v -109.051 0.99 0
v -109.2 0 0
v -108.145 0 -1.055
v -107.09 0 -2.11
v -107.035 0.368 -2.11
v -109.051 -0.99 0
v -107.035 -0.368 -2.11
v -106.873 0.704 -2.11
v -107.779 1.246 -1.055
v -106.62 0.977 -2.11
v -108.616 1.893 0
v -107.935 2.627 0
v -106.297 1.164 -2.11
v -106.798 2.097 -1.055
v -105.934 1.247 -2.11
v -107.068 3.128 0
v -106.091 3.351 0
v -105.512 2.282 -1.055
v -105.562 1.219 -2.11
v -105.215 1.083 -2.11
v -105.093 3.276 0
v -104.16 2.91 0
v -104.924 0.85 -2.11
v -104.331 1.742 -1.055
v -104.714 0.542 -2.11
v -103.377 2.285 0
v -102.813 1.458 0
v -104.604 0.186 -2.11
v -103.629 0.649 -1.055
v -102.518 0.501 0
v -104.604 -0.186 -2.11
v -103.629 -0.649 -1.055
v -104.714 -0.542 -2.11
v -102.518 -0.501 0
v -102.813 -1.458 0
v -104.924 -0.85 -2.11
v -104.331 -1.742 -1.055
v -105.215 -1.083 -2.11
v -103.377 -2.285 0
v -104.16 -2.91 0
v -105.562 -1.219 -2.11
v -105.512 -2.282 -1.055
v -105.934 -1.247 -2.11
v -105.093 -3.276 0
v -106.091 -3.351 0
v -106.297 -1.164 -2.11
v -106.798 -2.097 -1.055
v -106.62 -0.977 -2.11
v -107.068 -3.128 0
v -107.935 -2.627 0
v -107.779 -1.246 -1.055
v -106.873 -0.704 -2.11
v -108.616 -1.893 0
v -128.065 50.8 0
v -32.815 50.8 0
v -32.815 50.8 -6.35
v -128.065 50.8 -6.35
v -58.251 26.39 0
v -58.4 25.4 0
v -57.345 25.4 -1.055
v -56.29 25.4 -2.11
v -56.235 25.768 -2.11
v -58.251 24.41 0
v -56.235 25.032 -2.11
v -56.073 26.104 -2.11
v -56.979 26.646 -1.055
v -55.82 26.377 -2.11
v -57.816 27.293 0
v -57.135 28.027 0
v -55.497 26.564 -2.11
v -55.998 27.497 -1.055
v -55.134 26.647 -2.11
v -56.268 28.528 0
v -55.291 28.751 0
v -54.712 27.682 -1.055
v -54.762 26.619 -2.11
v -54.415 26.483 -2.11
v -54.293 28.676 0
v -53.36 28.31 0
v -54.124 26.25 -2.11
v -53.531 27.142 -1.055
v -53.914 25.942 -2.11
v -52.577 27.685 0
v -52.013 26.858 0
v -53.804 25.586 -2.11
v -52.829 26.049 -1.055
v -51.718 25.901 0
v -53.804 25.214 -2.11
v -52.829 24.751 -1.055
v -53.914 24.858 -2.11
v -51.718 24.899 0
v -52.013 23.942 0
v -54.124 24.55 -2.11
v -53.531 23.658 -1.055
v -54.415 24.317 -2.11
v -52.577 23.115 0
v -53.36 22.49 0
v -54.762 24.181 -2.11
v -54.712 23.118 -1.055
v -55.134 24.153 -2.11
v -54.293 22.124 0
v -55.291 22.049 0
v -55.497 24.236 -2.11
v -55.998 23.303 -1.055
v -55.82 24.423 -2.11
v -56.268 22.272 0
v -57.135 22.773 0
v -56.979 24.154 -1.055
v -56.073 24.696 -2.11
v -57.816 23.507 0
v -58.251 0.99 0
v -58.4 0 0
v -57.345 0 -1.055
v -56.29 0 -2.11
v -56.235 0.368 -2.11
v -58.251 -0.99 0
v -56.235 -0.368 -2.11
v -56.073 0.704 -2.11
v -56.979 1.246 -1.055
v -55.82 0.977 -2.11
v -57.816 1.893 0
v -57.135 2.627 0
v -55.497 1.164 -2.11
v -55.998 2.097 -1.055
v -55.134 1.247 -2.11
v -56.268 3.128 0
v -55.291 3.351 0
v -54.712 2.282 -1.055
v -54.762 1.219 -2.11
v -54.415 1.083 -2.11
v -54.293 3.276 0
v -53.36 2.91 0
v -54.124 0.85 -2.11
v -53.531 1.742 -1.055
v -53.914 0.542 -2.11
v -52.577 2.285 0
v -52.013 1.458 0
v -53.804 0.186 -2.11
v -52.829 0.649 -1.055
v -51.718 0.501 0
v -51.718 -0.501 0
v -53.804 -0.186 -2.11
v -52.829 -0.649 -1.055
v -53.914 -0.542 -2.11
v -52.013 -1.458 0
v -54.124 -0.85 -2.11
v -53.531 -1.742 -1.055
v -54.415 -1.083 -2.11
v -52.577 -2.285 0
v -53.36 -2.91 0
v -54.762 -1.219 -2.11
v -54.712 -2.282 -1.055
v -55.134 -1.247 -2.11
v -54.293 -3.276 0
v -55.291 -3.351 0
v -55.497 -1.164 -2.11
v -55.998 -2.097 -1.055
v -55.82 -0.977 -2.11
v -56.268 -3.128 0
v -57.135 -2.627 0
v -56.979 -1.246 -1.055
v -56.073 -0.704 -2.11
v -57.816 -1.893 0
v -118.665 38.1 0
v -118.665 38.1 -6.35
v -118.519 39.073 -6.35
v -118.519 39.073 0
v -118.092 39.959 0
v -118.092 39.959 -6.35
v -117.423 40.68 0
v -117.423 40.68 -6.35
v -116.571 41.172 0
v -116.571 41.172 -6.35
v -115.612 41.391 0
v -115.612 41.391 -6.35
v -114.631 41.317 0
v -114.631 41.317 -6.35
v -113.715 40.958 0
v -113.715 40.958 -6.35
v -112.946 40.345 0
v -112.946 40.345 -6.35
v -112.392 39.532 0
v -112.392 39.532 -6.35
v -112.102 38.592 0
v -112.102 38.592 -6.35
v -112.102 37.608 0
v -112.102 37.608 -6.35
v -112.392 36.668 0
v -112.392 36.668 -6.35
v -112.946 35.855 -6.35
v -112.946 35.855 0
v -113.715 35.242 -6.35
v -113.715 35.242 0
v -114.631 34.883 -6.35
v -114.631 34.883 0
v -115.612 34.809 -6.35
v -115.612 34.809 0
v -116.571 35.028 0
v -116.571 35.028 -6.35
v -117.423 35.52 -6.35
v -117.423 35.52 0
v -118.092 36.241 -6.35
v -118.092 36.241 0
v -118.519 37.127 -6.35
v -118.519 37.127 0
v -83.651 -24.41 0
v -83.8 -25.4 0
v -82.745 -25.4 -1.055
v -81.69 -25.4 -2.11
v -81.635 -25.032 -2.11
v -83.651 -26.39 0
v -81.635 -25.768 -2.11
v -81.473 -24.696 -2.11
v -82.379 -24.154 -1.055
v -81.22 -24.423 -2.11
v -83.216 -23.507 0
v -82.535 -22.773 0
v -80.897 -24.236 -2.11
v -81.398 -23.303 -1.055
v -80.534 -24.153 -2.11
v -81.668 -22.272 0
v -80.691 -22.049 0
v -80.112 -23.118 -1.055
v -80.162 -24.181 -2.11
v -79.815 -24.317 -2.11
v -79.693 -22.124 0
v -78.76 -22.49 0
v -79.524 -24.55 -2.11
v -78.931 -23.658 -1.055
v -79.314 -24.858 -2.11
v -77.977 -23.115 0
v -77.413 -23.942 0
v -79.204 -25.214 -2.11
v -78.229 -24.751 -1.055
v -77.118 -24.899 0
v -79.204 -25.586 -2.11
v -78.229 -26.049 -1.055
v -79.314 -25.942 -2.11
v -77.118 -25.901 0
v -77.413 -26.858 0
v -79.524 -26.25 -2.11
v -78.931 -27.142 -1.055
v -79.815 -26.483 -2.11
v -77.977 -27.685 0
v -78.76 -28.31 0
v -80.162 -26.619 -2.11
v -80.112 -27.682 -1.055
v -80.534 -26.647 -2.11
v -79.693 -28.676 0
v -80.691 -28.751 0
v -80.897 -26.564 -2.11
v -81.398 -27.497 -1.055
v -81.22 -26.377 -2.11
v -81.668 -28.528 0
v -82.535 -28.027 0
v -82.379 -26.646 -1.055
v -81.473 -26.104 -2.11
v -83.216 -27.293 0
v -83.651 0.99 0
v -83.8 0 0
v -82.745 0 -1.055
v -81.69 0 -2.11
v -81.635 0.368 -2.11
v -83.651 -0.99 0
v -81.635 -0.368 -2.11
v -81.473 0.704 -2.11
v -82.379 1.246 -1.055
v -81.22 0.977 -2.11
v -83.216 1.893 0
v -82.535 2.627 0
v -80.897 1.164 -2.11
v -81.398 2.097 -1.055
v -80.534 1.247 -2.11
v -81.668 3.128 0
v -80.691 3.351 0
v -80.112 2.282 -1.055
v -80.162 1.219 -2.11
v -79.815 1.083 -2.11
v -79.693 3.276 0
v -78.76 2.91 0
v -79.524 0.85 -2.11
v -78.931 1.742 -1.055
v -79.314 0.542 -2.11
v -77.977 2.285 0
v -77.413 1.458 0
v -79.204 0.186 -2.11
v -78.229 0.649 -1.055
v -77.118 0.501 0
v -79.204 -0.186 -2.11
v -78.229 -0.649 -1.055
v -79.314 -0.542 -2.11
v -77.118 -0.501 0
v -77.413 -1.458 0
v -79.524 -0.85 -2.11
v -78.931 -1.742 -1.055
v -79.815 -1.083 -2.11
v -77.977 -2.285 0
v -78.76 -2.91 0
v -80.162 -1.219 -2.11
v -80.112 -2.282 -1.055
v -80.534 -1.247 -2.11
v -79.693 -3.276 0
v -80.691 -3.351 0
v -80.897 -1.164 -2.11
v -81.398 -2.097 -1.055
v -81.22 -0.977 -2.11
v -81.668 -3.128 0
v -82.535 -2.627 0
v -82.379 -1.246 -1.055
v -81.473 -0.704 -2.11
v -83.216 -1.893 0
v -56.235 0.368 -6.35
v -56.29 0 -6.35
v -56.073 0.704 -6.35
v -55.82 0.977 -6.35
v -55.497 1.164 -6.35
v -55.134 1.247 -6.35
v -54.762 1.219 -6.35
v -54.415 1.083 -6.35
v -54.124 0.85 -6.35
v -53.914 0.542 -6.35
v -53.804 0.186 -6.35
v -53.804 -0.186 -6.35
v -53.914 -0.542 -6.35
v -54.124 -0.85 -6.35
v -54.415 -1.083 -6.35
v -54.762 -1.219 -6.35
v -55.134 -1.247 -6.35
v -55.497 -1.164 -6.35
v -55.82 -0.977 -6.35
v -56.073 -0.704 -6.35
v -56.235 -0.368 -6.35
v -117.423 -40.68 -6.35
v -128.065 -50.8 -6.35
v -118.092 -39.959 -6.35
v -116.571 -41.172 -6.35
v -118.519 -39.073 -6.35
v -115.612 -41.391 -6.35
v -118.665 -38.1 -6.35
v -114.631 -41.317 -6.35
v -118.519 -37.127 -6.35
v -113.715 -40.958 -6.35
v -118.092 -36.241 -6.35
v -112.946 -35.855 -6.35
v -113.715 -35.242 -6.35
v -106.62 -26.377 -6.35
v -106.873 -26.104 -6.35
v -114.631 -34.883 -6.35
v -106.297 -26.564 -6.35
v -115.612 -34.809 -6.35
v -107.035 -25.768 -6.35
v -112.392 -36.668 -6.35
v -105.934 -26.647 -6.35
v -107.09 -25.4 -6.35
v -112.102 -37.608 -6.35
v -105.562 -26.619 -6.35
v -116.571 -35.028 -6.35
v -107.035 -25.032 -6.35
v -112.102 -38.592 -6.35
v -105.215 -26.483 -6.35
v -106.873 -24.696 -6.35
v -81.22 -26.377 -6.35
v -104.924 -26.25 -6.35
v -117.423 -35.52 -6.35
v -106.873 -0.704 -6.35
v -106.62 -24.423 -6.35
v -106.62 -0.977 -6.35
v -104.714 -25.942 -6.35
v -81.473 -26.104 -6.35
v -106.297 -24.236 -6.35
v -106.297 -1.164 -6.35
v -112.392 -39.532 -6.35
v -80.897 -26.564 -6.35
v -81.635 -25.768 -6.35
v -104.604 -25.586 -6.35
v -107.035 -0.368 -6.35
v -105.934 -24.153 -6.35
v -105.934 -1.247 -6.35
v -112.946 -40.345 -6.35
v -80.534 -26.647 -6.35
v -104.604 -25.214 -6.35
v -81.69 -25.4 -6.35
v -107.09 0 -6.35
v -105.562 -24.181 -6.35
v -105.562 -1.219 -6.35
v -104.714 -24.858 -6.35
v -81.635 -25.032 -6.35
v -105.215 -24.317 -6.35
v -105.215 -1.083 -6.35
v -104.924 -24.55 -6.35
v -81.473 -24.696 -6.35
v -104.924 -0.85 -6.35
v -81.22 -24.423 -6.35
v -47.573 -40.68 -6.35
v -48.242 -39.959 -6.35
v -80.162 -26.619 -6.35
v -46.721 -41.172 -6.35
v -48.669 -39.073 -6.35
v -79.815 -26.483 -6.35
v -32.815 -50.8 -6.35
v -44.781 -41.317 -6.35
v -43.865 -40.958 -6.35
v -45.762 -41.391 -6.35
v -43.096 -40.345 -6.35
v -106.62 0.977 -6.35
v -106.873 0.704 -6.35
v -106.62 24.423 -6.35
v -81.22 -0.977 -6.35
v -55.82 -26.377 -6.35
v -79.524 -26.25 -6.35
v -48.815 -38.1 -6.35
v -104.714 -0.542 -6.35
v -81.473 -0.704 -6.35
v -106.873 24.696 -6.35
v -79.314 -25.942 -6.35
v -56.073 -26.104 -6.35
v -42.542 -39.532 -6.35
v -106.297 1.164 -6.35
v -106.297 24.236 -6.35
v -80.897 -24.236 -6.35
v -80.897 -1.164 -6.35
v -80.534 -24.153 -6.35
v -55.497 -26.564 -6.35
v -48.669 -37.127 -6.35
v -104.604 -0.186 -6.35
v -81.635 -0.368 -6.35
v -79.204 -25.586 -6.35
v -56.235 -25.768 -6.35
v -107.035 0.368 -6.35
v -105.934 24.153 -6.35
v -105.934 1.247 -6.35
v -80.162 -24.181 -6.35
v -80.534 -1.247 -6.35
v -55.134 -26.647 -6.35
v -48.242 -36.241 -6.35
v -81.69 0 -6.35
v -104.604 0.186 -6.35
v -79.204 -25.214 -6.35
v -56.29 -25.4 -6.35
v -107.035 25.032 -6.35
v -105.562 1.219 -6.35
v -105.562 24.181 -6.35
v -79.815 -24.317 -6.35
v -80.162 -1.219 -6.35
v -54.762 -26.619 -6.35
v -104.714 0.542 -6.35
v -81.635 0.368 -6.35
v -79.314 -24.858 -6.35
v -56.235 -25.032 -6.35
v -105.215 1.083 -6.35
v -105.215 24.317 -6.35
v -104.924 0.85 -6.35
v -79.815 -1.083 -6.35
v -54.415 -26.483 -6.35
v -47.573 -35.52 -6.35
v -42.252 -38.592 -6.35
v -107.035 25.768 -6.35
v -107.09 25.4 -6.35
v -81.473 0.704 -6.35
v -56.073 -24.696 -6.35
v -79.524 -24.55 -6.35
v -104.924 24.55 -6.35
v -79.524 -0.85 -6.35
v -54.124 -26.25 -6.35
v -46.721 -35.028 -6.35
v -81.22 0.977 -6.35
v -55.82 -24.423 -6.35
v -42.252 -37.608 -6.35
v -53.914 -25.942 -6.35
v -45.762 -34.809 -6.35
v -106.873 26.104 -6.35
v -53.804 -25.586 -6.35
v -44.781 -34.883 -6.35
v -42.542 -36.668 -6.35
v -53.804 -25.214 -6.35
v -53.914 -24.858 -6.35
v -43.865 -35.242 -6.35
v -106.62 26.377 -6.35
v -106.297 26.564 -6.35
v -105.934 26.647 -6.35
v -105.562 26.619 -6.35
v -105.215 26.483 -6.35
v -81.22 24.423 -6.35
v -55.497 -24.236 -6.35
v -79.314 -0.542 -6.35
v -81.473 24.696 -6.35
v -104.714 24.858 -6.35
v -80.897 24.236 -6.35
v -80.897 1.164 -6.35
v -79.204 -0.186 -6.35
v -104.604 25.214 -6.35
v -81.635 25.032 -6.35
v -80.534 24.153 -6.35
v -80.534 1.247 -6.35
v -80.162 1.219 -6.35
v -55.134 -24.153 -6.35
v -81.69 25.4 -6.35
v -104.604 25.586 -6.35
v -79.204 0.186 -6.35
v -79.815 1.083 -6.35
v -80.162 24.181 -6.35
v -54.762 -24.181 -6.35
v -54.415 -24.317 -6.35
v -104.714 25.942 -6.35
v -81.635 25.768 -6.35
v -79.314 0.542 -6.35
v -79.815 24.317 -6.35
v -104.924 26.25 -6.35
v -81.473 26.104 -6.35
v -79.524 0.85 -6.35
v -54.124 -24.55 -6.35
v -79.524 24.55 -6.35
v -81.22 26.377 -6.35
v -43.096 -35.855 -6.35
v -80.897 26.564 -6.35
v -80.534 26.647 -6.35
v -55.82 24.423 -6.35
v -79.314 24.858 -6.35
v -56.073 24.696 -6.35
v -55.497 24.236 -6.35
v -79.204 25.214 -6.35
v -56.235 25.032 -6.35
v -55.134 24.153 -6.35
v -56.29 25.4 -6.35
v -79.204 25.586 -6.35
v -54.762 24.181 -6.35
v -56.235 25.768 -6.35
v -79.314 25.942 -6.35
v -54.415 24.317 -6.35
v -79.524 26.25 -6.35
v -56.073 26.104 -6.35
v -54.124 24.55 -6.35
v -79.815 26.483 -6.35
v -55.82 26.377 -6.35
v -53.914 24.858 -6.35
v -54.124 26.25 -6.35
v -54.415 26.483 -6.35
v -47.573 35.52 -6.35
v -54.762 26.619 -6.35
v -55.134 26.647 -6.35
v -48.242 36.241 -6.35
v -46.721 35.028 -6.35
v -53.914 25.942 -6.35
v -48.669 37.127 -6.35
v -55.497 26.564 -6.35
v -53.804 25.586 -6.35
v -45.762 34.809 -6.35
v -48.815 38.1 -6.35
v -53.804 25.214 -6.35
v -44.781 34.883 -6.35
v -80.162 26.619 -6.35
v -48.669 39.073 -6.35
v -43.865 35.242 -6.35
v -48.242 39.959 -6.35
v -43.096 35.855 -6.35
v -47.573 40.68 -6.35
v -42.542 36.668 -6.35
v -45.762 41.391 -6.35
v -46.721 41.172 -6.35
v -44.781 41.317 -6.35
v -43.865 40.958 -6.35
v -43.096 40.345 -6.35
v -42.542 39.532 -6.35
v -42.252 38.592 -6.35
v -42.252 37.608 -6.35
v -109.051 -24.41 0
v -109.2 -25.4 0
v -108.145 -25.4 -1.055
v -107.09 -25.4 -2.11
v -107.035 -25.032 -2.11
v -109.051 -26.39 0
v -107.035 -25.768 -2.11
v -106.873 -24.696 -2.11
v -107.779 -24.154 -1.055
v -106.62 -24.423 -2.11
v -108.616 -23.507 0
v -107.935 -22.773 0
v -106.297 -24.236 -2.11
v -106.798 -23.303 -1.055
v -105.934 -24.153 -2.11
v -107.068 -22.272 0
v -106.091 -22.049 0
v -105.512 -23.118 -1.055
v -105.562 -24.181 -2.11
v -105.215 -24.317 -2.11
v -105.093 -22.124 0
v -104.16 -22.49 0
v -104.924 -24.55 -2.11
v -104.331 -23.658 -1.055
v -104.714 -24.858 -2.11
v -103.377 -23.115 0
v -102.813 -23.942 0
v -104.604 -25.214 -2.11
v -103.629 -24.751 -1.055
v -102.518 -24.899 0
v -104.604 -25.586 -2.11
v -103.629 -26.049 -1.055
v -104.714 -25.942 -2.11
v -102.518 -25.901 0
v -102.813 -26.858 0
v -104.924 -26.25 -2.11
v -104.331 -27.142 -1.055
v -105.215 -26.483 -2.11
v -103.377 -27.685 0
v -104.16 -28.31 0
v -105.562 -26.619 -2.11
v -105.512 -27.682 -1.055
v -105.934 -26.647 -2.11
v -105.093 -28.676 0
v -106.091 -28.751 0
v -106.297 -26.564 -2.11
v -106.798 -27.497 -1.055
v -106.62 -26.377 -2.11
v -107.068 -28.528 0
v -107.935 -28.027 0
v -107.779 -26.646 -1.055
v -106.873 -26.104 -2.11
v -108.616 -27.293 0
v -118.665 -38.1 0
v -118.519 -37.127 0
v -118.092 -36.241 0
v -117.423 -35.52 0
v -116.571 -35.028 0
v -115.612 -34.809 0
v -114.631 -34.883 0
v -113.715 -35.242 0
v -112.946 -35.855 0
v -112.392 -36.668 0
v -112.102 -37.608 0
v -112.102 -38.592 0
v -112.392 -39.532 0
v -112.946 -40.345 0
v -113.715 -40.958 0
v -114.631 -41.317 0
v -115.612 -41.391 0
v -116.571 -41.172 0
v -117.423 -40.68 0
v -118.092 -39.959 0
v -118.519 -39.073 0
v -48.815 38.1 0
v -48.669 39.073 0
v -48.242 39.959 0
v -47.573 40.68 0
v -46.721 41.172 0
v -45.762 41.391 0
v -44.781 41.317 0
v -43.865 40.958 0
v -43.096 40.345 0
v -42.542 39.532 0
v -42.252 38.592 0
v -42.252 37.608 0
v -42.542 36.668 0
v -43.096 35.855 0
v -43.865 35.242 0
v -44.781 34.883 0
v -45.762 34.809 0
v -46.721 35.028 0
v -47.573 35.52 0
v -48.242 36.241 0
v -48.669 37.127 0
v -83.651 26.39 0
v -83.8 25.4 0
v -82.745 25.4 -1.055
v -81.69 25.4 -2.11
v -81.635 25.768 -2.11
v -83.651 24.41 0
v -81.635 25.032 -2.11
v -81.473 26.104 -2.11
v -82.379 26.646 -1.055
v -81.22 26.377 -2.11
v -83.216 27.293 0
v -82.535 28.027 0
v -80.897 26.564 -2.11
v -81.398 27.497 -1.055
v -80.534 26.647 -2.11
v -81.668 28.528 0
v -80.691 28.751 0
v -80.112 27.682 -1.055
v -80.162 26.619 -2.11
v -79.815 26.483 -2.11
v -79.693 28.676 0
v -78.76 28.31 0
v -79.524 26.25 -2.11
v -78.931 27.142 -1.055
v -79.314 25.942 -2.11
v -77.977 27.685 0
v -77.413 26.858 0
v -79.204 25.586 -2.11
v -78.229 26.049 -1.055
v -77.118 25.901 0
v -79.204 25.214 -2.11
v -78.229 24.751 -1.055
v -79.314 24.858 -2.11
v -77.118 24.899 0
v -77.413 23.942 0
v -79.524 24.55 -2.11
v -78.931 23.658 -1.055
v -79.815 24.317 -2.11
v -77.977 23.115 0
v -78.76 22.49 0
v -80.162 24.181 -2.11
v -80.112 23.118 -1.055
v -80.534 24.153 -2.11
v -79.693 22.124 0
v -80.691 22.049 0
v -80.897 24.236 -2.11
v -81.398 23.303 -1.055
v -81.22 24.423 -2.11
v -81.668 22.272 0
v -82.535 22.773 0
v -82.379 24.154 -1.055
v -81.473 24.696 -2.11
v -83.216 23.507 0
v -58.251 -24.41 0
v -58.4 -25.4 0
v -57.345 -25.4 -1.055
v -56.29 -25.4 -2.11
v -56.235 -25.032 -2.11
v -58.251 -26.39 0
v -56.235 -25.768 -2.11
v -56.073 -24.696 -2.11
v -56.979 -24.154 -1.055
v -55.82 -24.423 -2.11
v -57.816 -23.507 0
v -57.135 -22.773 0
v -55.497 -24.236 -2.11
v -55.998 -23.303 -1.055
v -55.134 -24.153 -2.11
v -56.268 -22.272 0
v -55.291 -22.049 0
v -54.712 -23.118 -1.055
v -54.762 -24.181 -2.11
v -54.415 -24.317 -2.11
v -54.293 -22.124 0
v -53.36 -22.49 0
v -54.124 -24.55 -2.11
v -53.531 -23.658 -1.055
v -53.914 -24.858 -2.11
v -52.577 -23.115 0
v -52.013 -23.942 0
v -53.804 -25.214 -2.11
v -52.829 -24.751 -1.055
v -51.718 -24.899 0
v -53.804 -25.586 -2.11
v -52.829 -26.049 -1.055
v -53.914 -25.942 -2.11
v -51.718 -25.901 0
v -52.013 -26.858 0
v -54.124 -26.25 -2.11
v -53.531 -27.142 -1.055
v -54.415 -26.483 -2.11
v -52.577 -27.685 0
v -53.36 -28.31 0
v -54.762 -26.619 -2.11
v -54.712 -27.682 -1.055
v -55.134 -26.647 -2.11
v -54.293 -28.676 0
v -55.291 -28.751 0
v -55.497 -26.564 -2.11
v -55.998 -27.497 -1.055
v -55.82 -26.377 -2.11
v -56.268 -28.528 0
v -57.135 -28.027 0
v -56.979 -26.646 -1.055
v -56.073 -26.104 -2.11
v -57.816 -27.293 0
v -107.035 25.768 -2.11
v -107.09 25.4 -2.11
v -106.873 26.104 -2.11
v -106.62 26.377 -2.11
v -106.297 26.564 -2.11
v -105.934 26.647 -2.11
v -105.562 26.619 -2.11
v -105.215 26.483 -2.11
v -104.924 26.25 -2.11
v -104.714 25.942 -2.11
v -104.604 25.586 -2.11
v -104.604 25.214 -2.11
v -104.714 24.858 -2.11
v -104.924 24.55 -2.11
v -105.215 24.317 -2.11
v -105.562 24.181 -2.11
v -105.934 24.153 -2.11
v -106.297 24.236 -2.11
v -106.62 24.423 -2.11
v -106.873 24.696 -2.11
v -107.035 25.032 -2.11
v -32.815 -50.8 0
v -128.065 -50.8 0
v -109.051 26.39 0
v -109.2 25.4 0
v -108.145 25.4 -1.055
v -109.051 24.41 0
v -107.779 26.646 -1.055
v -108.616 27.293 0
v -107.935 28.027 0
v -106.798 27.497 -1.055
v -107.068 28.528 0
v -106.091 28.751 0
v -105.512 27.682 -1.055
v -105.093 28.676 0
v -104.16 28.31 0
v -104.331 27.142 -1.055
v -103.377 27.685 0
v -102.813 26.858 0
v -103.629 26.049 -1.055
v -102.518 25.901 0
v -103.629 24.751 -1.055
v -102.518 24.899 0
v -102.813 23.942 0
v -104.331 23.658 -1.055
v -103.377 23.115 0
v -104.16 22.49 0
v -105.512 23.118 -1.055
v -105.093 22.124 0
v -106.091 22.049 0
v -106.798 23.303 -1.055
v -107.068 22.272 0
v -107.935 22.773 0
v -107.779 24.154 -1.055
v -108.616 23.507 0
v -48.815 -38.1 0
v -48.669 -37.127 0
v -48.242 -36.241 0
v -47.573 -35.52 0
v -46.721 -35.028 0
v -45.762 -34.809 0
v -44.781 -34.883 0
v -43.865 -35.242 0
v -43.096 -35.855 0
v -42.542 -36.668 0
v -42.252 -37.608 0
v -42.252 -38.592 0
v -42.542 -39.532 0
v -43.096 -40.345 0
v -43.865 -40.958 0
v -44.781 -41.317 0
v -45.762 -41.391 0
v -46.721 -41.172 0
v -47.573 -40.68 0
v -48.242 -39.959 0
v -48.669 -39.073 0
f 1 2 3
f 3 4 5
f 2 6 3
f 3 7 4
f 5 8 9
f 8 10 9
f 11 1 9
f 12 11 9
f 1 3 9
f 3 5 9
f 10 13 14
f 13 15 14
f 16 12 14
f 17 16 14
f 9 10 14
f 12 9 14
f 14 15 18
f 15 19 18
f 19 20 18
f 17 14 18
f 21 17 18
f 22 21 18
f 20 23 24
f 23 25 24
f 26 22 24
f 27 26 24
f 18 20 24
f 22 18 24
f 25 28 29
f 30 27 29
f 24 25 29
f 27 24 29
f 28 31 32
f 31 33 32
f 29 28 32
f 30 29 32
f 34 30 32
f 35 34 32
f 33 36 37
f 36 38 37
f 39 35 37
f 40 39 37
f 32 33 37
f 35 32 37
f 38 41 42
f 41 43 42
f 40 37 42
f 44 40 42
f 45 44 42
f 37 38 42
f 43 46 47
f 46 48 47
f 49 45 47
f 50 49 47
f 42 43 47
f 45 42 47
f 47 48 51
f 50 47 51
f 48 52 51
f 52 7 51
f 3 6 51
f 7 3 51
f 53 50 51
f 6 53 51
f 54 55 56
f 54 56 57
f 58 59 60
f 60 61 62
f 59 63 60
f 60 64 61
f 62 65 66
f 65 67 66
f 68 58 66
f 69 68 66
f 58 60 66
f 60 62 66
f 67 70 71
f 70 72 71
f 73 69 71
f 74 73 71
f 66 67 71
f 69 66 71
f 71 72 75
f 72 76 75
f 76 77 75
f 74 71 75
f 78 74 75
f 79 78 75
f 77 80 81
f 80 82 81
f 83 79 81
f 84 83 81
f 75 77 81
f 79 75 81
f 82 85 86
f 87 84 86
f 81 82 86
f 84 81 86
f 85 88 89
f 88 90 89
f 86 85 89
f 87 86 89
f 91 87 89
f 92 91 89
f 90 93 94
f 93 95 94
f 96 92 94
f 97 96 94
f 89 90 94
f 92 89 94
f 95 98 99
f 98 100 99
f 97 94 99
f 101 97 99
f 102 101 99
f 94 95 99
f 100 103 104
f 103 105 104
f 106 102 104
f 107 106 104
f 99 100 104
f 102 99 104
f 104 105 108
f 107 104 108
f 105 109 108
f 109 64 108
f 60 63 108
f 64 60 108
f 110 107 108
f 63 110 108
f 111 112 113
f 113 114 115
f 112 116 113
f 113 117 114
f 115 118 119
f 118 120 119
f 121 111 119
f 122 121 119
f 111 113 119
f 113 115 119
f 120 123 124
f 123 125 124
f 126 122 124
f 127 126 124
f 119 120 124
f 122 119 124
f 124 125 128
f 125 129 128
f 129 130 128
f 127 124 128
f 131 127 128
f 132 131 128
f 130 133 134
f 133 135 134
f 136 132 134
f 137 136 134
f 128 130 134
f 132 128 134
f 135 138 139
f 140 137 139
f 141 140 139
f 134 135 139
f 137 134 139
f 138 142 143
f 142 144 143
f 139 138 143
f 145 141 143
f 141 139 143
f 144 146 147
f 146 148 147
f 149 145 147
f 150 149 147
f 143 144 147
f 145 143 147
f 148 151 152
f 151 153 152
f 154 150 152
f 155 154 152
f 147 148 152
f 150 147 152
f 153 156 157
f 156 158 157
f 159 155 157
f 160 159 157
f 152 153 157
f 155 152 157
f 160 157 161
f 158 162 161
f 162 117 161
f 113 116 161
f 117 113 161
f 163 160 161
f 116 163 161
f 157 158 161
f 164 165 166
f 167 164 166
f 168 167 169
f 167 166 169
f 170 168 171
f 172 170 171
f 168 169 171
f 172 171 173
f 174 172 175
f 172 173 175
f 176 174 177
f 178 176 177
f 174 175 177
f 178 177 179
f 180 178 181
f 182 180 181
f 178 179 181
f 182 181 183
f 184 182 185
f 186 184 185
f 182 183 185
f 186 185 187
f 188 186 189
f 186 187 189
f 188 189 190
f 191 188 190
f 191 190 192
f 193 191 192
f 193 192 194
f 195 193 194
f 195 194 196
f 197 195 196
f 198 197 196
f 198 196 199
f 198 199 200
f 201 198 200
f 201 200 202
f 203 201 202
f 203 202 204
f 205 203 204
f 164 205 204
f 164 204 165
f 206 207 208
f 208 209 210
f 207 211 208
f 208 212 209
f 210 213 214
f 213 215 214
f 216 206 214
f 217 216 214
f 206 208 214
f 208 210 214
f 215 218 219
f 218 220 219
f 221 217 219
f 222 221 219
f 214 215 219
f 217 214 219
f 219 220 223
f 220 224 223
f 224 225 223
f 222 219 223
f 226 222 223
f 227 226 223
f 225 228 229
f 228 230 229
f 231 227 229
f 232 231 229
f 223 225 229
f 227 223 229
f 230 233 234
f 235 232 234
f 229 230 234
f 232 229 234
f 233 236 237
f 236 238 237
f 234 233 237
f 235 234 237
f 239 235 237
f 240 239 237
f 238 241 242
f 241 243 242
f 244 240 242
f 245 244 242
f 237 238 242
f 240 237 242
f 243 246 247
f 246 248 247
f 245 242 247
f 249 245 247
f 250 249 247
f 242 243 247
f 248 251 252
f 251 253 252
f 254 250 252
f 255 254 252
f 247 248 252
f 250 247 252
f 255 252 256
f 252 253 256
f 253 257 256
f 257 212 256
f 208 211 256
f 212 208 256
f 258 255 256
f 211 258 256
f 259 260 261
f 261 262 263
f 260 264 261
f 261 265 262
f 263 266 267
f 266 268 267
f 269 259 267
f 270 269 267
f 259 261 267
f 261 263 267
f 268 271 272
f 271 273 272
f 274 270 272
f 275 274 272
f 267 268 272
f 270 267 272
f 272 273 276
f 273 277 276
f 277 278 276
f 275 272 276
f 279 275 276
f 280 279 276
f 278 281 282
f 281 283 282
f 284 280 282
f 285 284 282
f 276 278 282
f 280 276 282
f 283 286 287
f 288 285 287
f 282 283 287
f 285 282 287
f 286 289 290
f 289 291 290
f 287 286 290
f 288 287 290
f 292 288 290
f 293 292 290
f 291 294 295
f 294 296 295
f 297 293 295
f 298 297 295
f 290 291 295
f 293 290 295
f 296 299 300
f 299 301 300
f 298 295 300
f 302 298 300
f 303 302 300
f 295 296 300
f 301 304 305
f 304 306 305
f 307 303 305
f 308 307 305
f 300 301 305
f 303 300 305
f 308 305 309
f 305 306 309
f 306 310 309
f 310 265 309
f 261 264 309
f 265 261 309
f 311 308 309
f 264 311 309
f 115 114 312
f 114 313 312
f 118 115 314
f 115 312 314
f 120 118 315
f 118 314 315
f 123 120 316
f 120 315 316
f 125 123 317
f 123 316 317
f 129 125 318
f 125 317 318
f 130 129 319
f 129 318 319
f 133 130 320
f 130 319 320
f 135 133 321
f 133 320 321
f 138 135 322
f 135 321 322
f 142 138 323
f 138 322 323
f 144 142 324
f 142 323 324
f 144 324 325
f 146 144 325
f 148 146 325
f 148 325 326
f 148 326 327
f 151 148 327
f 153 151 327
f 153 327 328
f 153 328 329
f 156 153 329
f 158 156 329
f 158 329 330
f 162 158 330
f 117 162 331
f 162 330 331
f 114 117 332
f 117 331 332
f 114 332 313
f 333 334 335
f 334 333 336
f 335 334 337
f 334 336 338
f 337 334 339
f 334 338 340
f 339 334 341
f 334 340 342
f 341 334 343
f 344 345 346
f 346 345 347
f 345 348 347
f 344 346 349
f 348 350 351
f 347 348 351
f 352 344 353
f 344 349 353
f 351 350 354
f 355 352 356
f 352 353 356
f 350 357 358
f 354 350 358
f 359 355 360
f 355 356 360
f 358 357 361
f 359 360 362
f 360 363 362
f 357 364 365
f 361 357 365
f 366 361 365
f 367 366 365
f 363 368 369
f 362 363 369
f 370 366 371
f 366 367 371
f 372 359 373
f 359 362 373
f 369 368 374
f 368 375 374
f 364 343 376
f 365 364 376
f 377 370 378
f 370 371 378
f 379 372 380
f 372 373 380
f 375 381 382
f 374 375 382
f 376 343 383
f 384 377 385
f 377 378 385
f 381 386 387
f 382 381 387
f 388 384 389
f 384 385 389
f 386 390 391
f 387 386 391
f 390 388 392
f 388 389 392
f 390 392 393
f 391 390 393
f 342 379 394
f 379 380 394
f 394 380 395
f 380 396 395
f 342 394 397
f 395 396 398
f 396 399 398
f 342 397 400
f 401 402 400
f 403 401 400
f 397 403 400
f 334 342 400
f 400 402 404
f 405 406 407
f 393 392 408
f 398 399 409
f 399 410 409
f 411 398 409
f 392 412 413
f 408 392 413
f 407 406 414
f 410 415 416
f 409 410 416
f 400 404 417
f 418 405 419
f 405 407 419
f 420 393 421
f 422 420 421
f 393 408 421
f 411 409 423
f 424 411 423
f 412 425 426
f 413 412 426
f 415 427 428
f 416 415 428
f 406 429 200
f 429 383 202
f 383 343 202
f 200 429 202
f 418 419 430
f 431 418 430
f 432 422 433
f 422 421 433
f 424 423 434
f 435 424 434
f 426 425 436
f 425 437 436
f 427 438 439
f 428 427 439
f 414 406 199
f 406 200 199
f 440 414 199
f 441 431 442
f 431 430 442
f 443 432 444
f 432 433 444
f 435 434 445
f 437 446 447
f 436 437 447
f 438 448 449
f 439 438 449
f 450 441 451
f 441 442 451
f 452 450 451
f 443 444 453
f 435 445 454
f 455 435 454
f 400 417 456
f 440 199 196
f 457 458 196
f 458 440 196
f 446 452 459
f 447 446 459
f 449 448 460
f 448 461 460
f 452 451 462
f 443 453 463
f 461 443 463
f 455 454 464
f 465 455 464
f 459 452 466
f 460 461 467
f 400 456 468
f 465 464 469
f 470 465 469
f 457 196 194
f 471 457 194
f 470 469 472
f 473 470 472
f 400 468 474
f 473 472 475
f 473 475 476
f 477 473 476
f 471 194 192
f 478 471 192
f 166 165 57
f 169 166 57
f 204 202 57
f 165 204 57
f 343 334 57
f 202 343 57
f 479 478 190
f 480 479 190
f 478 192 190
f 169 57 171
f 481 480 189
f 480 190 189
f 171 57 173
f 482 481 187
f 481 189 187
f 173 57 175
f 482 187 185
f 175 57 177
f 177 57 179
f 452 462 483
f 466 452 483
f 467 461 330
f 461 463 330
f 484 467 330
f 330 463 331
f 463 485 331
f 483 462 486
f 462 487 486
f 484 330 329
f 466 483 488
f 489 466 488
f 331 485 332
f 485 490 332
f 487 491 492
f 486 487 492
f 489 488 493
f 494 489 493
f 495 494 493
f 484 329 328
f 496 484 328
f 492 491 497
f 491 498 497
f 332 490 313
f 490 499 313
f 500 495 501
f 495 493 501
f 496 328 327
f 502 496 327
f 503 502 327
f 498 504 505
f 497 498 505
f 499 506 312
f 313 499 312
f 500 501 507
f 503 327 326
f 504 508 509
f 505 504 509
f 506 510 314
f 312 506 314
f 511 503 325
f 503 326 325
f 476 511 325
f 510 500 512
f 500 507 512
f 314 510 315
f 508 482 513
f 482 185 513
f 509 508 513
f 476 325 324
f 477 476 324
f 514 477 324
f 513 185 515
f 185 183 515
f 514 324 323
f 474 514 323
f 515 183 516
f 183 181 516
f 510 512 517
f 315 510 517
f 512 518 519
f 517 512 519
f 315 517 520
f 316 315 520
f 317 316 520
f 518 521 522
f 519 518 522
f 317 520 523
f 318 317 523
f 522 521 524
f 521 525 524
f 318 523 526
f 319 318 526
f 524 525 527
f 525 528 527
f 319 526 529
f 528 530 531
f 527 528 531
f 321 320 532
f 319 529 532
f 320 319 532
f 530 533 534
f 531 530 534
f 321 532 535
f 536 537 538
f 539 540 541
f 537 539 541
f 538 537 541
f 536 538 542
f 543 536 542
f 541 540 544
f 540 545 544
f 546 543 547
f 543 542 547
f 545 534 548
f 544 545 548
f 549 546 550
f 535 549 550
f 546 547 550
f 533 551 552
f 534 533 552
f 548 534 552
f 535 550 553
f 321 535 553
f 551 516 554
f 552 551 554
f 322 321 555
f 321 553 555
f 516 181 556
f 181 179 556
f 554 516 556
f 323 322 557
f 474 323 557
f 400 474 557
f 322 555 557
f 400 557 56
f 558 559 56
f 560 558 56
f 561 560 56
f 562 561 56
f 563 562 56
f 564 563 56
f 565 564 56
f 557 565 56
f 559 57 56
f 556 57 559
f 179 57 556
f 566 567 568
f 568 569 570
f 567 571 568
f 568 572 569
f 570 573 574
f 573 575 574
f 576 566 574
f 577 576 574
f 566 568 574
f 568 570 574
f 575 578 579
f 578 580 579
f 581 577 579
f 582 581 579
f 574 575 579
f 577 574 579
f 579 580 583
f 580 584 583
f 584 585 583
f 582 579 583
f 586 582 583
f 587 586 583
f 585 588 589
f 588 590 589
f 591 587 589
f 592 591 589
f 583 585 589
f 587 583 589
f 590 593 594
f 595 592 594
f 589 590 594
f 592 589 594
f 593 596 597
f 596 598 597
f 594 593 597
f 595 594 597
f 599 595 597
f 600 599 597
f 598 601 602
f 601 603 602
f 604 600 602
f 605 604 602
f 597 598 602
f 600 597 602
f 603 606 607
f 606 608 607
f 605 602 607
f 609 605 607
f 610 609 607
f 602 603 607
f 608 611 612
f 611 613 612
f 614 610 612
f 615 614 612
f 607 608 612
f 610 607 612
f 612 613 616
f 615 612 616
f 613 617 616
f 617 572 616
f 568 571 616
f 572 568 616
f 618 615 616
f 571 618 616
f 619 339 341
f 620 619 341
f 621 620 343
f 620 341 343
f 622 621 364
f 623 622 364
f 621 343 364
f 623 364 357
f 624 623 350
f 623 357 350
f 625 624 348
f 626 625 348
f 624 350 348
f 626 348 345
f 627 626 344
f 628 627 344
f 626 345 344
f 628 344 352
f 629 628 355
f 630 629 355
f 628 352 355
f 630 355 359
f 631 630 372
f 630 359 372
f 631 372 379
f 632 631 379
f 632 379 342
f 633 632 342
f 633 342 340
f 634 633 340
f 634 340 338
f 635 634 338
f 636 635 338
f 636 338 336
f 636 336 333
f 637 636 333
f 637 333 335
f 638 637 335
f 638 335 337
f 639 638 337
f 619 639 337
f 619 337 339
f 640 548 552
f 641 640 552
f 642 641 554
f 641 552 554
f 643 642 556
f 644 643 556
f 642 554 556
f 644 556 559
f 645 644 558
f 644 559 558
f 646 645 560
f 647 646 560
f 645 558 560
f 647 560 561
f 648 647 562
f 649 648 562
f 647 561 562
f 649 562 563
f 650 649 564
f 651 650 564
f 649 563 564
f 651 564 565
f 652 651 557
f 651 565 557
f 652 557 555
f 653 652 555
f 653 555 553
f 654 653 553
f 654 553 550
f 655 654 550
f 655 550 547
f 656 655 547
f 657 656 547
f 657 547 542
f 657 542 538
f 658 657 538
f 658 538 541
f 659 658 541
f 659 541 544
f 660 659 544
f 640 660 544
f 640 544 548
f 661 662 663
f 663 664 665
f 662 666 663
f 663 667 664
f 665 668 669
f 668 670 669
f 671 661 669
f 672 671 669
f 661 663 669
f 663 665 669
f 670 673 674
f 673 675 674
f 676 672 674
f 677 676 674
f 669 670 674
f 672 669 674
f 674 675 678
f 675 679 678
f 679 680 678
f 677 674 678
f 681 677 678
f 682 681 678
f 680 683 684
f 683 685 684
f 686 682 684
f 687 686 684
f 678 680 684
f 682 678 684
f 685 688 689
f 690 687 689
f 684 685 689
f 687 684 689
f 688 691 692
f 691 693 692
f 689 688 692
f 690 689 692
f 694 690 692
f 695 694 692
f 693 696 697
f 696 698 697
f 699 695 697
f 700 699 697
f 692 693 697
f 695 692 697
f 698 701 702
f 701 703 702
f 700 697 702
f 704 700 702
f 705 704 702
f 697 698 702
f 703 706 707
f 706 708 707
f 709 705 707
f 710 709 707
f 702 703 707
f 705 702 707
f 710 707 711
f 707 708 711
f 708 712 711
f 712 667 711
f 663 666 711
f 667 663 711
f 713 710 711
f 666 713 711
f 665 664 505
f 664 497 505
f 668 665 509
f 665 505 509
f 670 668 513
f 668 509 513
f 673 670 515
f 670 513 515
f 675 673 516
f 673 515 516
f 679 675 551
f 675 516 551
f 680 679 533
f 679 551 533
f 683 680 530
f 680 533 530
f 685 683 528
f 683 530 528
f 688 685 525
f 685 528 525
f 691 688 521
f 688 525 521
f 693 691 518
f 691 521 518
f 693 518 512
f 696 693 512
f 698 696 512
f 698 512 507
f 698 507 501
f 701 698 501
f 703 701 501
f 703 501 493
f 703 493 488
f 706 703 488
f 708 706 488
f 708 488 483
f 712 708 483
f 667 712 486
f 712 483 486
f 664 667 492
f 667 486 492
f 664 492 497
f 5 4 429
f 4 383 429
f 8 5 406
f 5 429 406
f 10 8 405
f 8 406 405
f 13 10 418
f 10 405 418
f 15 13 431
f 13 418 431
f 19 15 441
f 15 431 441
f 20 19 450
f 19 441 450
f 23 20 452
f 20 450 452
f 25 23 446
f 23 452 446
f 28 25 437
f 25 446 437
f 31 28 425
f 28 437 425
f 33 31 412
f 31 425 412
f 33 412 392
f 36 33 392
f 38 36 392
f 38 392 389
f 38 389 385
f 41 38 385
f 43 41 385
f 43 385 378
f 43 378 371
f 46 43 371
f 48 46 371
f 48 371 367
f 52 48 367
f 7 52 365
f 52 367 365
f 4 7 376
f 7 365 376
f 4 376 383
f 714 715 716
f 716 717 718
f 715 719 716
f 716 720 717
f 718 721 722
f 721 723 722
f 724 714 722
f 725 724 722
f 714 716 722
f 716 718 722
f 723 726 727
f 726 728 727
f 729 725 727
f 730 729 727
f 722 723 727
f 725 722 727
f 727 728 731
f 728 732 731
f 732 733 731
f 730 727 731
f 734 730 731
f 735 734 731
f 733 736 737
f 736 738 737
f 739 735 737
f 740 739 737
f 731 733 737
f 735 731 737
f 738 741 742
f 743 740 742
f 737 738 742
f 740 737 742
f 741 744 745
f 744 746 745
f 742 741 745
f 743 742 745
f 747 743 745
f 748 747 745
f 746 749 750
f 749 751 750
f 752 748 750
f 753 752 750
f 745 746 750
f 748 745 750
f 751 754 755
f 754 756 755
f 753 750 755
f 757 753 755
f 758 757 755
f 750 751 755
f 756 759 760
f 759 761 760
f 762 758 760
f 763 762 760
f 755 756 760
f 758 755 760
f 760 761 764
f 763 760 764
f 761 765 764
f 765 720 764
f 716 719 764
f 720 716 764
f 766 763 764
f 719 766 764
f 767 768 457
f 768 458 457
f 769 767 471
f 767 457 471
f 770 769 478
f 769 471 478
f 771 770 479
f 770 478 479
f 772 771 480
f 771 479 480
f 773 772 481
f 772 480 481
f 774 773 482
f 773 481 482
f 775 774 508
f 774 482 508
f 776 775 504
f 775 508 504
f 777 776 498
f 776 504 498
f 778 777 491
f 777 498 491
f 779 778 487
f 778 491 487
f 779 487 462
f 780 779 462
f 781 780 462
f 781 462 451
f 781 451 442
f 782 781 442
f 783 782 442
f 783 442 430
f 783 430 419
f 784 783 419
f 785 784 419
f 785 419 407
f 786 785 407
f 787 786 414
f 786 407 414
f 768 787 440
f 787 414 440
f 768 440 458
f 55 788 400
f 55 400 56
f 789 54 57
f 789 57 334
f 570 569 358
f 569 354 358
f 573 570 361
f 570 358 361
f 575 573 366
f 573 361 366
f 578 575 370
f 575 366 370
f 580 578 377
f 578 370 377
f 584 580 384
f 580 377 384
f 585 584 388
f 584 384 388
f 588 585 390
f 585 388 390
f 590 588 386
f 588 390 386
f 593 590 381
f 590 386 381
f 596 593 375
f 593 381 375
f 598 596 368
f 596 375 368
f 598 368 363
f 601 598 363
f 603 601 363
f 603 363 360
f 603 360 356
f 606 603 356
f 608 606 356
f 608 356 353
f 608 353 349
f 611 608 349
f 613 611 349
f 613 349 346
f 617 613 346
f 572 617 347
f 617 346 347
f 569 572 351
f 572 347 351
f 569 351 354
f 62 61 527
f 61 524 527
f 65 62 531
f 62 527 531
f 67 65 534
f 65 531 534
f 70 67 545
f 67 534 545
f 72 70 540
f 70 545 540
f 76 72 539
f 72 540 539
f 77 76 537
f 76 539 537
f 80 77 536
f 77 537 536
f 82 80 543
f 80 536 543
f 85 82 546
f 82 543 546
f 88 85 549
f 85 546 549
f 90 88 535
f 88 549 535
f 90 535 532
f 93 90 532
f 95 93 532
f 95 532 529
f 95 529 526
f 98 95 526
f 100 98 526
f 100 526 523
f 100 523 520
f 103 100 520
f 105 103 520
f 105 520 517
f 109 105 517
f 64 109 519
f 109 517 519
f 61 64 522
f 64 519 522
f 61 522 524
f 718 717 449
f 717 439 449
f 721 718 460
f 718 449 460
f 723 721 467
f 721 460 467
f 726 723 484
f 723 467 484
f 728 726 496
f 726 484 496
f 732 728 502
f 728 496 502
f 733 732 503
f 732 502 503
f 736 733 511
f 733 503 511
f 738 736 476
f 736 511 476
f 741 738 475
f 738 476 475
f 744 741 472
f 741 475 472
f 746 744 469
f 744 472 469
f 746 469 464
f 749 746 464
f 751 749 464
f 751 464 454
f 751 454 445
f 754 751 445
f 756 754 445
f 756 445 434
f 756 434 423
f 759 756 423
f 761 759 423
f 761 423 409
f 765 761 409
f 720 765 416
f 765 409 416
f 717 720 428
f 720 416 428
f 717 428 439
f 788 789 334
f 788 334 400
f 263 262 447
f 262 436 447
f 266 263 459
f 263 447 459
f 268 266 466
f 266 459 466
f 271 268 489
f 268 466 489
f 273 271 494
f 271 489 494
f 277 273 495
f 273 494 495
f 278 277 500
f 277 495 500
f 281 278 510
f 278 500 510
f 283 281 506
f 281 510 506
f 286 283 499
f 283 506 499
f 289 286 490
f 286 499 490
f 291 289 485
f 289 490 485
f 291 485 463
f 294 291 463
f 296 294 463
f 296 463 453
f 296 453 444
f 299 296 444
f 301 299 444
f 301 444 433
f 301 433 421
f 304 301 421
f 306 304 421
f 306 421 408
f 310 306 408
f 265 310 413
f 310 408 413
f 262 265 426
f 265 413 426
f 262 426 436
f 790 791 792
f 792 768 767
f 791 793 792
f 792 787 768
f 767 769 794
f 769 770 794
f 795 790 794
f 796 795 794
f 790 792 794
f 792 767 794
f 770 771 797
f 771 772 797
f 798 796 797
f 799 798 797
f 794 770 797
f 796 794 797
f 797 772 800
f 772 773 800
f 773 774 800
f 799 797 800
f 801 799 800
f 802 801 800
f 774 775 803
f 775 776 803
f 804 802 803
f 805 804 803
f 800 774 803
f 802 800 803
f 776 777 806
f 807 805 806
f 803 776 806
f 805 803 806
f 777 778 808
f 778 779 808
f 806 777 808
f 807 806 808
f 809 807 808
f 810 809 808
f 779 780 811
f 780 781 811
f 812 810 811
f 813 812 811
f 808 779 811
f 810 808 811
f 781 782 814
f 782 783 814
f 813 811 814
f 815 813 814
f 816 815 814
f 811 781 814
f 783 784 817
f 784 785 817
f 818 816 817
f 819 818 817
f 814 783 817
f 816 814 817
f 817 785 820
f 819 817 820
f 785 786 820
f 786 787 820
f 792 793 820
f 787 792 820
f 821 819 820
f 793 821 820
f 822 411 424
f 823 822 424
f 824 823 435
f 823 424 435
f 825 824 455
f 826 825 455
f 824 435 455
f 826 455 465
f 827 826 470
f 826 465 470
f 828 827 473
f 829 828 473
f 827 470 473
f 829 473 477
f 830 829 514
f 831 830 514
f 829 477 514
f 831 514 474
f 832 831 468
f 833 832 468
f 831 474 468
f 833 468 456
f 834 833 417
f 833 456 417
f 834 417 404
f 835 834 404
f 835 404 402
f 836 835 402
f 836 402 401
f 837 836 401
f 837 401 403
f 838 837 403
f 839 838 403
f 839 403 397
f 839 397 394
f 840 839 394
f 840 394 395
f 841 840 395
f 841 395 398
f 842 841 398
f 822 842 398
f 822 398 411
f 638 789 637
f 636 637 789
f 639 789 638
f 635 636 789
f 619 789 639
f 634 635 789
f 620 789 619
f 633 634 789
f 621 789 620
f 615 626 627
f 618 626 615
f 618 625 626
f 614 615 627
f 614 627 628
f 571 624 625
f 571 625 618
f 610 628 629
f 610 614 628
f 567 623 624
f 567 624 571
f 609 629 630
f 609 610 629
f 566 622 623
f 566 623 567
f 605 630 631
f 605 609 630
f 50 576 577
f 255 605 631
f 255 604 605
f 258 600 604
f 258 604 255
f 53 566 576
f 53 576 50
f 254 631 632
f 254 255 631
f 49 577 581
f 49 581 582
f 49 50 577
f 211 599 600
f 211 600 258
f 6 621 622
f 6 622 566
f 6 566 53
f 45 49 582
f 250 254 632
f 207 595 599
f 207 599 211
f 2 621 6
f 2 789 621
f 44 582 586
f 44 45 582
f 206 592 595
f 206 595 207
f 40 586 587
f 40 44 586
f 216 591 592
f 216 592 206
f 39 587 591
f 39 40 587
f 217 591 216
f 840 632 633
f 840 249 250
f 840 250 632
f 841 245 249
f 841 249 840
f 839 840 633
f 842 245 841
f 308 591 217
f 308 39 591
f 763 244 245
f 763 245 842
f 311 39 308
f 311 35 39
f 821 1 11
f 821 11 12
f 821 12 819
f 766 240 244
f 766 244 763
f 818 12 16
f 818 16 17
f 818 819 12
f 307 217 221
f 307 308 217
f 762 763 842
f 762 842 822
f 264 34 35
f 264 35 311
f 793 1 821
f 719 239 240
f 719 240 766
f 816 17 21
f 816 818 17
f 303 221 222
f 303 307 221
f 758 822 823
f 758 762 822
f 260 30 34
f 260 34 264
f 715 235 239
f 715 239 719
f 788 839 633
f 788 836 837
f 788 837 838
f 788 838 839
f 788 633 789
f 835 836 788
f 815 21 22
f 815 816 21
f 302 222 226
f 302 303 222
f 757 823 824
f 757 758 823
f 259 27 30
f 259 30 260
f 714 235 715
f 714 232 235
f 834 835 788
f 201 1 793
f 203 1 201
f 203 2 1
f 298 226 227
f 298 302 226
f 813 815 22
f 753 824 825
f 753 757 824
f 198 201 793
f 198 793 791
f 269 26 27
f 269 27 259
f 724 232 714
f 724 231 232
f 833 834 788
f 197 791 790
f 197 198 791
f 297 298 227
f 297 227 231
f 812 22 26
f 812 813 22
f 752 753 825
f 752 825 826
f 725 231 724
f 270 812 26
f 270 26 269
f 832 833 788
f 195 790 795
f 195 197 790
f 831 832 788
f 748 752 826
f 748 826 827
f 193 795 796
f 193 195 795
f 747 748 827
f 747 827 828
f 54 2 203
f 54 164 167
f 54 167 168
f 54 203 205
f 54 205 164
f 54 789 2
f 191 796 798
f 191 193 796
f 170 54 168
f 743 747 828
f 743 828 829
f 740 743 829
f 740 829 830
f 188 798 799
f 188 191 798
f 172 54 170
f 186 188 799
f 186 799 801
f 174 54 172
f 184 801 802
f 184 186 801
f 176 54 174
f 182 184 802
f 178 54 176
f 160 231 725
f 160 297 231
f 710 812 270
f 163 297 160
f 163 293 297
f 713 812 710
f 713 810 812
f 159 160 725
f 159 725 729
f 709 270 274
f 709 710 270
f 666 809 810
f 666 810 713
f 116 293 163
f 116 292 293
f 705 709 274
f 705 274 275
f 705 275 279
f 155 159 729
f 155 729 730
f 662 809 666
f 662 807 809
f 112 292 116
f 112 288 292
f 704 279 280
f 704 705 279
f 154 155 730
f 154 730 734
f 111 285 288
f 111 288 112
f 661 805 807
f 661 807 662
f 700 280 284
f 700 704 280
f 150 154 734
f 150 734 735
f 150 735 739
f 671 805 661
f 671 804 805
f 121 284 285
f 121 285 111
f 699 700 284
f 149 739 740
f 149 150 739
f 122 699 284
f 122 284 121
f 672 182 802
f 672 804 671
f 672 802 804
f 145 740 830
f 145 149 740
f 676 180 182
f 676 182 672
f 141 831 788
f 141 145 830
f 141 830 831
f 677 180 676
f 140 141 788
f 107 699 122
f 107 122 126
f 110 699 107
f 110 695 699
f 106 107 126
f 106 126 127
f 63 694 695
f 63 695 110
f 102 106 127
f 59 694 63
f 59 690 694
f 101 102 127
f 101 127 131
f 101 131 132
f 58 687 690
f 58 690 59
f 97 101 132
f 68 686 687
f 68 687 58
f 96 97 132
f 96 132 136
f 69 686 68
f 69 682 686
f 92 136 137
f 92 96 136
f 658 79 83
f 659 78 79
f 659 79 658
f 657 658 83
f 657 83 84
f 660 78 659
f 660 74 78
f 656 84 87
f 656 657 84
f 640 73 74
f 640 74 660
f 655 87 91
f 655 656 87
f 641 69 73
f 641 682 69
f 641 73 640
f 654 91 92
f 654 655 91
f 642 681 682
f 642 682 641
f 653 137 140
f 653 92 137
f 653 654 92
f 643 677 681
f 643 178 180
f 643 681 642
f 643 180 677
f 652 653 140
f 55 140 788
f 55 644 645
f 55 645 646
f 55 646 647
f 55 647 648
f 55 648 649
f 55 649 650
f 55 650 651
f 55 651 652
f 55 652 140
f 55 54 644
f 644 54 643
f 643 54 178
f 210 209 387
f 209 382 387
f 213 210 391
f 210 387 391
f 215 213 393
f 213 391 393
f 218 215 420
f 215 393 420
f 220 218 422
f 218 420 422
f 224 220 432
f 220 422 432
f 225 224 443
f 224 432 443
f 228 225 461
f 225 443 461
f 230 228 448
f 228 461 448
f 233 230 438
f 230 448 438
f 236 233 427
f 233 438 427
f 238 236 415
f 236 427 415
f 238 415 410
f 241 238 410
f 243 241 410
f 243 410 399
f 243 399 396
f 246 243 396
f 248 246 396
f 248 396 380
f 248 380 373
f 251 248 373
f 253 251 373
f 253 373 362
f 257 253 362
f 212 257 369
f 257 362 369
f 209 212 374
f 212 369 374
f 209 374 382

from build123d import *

# Parameters (mm, degrees)
F1_DEPTH       = 6.35
F2_D           = 6.6
F2_DEPTH       = 12.7
F2_TIP         = 1.9828400428
F3_D           = 2.5
F3_DEPTH       = 12.7014
F3_CSINK_D     = 6.72
F3_CSINK_ANGLE = 90
F3_TIP         = 0.7510757738


with BuildPart() as f1:
    # F0 (on Top) → F1 (new body)
    with BuildSketch(Plane.XY):
        Polygon((-32.8152788184, 50.8), (-128.0652788184, 50.8), (-128.0652788184, -50.8), (-96.3170453906, -50.8), (-32.8152788184, -50.8), align=None)
    extrude(amount=-F1_DEPTH)

    # F2
    with Locations(Plane.XY):
        with Locations((-115.3652788184, 38.1), (-45.5152788184, 38.1), (-45.5152788184, -38.1), (-115.3652788184, -38.1)):
            Hole(F2_D / 2, depth=F2_DEPTH)
            with Locations((0, 0, -(F2_DEPTH + F2_TIP / 2))):  # 118° drill point
                Cone(0, F2_D / 2, F2_TIP, mode=Mode.SUBTRACT)

    # F3
    with Locations(Plane.XY):
        with Locations((-105.8402788184, 25.4), (-80.4402788184, 25.4), (-55.0402788184, 25.4), (-80.4402788184, 0), (-55.0402788184, 0), (-105.8402788184, 0), (-105.8402788184, -25.4), (-80.4402788184, -25.4), (-55.0402788184, -25.4)):
            CounterSinkHole(F3_D / 2, F3_CSINK_D / 2, depth=F3_DEPTH, counter_sink_angle=F3_CSINK_ANGLE)
            with Locations((0, 0, -(F3_DEPTH + F3_TIP / 2))):  # 118° drill point
                Cone(0, F3_D / 2, F3_TIP, mode=Mode.SUBTRACT)


solid = f1.part
